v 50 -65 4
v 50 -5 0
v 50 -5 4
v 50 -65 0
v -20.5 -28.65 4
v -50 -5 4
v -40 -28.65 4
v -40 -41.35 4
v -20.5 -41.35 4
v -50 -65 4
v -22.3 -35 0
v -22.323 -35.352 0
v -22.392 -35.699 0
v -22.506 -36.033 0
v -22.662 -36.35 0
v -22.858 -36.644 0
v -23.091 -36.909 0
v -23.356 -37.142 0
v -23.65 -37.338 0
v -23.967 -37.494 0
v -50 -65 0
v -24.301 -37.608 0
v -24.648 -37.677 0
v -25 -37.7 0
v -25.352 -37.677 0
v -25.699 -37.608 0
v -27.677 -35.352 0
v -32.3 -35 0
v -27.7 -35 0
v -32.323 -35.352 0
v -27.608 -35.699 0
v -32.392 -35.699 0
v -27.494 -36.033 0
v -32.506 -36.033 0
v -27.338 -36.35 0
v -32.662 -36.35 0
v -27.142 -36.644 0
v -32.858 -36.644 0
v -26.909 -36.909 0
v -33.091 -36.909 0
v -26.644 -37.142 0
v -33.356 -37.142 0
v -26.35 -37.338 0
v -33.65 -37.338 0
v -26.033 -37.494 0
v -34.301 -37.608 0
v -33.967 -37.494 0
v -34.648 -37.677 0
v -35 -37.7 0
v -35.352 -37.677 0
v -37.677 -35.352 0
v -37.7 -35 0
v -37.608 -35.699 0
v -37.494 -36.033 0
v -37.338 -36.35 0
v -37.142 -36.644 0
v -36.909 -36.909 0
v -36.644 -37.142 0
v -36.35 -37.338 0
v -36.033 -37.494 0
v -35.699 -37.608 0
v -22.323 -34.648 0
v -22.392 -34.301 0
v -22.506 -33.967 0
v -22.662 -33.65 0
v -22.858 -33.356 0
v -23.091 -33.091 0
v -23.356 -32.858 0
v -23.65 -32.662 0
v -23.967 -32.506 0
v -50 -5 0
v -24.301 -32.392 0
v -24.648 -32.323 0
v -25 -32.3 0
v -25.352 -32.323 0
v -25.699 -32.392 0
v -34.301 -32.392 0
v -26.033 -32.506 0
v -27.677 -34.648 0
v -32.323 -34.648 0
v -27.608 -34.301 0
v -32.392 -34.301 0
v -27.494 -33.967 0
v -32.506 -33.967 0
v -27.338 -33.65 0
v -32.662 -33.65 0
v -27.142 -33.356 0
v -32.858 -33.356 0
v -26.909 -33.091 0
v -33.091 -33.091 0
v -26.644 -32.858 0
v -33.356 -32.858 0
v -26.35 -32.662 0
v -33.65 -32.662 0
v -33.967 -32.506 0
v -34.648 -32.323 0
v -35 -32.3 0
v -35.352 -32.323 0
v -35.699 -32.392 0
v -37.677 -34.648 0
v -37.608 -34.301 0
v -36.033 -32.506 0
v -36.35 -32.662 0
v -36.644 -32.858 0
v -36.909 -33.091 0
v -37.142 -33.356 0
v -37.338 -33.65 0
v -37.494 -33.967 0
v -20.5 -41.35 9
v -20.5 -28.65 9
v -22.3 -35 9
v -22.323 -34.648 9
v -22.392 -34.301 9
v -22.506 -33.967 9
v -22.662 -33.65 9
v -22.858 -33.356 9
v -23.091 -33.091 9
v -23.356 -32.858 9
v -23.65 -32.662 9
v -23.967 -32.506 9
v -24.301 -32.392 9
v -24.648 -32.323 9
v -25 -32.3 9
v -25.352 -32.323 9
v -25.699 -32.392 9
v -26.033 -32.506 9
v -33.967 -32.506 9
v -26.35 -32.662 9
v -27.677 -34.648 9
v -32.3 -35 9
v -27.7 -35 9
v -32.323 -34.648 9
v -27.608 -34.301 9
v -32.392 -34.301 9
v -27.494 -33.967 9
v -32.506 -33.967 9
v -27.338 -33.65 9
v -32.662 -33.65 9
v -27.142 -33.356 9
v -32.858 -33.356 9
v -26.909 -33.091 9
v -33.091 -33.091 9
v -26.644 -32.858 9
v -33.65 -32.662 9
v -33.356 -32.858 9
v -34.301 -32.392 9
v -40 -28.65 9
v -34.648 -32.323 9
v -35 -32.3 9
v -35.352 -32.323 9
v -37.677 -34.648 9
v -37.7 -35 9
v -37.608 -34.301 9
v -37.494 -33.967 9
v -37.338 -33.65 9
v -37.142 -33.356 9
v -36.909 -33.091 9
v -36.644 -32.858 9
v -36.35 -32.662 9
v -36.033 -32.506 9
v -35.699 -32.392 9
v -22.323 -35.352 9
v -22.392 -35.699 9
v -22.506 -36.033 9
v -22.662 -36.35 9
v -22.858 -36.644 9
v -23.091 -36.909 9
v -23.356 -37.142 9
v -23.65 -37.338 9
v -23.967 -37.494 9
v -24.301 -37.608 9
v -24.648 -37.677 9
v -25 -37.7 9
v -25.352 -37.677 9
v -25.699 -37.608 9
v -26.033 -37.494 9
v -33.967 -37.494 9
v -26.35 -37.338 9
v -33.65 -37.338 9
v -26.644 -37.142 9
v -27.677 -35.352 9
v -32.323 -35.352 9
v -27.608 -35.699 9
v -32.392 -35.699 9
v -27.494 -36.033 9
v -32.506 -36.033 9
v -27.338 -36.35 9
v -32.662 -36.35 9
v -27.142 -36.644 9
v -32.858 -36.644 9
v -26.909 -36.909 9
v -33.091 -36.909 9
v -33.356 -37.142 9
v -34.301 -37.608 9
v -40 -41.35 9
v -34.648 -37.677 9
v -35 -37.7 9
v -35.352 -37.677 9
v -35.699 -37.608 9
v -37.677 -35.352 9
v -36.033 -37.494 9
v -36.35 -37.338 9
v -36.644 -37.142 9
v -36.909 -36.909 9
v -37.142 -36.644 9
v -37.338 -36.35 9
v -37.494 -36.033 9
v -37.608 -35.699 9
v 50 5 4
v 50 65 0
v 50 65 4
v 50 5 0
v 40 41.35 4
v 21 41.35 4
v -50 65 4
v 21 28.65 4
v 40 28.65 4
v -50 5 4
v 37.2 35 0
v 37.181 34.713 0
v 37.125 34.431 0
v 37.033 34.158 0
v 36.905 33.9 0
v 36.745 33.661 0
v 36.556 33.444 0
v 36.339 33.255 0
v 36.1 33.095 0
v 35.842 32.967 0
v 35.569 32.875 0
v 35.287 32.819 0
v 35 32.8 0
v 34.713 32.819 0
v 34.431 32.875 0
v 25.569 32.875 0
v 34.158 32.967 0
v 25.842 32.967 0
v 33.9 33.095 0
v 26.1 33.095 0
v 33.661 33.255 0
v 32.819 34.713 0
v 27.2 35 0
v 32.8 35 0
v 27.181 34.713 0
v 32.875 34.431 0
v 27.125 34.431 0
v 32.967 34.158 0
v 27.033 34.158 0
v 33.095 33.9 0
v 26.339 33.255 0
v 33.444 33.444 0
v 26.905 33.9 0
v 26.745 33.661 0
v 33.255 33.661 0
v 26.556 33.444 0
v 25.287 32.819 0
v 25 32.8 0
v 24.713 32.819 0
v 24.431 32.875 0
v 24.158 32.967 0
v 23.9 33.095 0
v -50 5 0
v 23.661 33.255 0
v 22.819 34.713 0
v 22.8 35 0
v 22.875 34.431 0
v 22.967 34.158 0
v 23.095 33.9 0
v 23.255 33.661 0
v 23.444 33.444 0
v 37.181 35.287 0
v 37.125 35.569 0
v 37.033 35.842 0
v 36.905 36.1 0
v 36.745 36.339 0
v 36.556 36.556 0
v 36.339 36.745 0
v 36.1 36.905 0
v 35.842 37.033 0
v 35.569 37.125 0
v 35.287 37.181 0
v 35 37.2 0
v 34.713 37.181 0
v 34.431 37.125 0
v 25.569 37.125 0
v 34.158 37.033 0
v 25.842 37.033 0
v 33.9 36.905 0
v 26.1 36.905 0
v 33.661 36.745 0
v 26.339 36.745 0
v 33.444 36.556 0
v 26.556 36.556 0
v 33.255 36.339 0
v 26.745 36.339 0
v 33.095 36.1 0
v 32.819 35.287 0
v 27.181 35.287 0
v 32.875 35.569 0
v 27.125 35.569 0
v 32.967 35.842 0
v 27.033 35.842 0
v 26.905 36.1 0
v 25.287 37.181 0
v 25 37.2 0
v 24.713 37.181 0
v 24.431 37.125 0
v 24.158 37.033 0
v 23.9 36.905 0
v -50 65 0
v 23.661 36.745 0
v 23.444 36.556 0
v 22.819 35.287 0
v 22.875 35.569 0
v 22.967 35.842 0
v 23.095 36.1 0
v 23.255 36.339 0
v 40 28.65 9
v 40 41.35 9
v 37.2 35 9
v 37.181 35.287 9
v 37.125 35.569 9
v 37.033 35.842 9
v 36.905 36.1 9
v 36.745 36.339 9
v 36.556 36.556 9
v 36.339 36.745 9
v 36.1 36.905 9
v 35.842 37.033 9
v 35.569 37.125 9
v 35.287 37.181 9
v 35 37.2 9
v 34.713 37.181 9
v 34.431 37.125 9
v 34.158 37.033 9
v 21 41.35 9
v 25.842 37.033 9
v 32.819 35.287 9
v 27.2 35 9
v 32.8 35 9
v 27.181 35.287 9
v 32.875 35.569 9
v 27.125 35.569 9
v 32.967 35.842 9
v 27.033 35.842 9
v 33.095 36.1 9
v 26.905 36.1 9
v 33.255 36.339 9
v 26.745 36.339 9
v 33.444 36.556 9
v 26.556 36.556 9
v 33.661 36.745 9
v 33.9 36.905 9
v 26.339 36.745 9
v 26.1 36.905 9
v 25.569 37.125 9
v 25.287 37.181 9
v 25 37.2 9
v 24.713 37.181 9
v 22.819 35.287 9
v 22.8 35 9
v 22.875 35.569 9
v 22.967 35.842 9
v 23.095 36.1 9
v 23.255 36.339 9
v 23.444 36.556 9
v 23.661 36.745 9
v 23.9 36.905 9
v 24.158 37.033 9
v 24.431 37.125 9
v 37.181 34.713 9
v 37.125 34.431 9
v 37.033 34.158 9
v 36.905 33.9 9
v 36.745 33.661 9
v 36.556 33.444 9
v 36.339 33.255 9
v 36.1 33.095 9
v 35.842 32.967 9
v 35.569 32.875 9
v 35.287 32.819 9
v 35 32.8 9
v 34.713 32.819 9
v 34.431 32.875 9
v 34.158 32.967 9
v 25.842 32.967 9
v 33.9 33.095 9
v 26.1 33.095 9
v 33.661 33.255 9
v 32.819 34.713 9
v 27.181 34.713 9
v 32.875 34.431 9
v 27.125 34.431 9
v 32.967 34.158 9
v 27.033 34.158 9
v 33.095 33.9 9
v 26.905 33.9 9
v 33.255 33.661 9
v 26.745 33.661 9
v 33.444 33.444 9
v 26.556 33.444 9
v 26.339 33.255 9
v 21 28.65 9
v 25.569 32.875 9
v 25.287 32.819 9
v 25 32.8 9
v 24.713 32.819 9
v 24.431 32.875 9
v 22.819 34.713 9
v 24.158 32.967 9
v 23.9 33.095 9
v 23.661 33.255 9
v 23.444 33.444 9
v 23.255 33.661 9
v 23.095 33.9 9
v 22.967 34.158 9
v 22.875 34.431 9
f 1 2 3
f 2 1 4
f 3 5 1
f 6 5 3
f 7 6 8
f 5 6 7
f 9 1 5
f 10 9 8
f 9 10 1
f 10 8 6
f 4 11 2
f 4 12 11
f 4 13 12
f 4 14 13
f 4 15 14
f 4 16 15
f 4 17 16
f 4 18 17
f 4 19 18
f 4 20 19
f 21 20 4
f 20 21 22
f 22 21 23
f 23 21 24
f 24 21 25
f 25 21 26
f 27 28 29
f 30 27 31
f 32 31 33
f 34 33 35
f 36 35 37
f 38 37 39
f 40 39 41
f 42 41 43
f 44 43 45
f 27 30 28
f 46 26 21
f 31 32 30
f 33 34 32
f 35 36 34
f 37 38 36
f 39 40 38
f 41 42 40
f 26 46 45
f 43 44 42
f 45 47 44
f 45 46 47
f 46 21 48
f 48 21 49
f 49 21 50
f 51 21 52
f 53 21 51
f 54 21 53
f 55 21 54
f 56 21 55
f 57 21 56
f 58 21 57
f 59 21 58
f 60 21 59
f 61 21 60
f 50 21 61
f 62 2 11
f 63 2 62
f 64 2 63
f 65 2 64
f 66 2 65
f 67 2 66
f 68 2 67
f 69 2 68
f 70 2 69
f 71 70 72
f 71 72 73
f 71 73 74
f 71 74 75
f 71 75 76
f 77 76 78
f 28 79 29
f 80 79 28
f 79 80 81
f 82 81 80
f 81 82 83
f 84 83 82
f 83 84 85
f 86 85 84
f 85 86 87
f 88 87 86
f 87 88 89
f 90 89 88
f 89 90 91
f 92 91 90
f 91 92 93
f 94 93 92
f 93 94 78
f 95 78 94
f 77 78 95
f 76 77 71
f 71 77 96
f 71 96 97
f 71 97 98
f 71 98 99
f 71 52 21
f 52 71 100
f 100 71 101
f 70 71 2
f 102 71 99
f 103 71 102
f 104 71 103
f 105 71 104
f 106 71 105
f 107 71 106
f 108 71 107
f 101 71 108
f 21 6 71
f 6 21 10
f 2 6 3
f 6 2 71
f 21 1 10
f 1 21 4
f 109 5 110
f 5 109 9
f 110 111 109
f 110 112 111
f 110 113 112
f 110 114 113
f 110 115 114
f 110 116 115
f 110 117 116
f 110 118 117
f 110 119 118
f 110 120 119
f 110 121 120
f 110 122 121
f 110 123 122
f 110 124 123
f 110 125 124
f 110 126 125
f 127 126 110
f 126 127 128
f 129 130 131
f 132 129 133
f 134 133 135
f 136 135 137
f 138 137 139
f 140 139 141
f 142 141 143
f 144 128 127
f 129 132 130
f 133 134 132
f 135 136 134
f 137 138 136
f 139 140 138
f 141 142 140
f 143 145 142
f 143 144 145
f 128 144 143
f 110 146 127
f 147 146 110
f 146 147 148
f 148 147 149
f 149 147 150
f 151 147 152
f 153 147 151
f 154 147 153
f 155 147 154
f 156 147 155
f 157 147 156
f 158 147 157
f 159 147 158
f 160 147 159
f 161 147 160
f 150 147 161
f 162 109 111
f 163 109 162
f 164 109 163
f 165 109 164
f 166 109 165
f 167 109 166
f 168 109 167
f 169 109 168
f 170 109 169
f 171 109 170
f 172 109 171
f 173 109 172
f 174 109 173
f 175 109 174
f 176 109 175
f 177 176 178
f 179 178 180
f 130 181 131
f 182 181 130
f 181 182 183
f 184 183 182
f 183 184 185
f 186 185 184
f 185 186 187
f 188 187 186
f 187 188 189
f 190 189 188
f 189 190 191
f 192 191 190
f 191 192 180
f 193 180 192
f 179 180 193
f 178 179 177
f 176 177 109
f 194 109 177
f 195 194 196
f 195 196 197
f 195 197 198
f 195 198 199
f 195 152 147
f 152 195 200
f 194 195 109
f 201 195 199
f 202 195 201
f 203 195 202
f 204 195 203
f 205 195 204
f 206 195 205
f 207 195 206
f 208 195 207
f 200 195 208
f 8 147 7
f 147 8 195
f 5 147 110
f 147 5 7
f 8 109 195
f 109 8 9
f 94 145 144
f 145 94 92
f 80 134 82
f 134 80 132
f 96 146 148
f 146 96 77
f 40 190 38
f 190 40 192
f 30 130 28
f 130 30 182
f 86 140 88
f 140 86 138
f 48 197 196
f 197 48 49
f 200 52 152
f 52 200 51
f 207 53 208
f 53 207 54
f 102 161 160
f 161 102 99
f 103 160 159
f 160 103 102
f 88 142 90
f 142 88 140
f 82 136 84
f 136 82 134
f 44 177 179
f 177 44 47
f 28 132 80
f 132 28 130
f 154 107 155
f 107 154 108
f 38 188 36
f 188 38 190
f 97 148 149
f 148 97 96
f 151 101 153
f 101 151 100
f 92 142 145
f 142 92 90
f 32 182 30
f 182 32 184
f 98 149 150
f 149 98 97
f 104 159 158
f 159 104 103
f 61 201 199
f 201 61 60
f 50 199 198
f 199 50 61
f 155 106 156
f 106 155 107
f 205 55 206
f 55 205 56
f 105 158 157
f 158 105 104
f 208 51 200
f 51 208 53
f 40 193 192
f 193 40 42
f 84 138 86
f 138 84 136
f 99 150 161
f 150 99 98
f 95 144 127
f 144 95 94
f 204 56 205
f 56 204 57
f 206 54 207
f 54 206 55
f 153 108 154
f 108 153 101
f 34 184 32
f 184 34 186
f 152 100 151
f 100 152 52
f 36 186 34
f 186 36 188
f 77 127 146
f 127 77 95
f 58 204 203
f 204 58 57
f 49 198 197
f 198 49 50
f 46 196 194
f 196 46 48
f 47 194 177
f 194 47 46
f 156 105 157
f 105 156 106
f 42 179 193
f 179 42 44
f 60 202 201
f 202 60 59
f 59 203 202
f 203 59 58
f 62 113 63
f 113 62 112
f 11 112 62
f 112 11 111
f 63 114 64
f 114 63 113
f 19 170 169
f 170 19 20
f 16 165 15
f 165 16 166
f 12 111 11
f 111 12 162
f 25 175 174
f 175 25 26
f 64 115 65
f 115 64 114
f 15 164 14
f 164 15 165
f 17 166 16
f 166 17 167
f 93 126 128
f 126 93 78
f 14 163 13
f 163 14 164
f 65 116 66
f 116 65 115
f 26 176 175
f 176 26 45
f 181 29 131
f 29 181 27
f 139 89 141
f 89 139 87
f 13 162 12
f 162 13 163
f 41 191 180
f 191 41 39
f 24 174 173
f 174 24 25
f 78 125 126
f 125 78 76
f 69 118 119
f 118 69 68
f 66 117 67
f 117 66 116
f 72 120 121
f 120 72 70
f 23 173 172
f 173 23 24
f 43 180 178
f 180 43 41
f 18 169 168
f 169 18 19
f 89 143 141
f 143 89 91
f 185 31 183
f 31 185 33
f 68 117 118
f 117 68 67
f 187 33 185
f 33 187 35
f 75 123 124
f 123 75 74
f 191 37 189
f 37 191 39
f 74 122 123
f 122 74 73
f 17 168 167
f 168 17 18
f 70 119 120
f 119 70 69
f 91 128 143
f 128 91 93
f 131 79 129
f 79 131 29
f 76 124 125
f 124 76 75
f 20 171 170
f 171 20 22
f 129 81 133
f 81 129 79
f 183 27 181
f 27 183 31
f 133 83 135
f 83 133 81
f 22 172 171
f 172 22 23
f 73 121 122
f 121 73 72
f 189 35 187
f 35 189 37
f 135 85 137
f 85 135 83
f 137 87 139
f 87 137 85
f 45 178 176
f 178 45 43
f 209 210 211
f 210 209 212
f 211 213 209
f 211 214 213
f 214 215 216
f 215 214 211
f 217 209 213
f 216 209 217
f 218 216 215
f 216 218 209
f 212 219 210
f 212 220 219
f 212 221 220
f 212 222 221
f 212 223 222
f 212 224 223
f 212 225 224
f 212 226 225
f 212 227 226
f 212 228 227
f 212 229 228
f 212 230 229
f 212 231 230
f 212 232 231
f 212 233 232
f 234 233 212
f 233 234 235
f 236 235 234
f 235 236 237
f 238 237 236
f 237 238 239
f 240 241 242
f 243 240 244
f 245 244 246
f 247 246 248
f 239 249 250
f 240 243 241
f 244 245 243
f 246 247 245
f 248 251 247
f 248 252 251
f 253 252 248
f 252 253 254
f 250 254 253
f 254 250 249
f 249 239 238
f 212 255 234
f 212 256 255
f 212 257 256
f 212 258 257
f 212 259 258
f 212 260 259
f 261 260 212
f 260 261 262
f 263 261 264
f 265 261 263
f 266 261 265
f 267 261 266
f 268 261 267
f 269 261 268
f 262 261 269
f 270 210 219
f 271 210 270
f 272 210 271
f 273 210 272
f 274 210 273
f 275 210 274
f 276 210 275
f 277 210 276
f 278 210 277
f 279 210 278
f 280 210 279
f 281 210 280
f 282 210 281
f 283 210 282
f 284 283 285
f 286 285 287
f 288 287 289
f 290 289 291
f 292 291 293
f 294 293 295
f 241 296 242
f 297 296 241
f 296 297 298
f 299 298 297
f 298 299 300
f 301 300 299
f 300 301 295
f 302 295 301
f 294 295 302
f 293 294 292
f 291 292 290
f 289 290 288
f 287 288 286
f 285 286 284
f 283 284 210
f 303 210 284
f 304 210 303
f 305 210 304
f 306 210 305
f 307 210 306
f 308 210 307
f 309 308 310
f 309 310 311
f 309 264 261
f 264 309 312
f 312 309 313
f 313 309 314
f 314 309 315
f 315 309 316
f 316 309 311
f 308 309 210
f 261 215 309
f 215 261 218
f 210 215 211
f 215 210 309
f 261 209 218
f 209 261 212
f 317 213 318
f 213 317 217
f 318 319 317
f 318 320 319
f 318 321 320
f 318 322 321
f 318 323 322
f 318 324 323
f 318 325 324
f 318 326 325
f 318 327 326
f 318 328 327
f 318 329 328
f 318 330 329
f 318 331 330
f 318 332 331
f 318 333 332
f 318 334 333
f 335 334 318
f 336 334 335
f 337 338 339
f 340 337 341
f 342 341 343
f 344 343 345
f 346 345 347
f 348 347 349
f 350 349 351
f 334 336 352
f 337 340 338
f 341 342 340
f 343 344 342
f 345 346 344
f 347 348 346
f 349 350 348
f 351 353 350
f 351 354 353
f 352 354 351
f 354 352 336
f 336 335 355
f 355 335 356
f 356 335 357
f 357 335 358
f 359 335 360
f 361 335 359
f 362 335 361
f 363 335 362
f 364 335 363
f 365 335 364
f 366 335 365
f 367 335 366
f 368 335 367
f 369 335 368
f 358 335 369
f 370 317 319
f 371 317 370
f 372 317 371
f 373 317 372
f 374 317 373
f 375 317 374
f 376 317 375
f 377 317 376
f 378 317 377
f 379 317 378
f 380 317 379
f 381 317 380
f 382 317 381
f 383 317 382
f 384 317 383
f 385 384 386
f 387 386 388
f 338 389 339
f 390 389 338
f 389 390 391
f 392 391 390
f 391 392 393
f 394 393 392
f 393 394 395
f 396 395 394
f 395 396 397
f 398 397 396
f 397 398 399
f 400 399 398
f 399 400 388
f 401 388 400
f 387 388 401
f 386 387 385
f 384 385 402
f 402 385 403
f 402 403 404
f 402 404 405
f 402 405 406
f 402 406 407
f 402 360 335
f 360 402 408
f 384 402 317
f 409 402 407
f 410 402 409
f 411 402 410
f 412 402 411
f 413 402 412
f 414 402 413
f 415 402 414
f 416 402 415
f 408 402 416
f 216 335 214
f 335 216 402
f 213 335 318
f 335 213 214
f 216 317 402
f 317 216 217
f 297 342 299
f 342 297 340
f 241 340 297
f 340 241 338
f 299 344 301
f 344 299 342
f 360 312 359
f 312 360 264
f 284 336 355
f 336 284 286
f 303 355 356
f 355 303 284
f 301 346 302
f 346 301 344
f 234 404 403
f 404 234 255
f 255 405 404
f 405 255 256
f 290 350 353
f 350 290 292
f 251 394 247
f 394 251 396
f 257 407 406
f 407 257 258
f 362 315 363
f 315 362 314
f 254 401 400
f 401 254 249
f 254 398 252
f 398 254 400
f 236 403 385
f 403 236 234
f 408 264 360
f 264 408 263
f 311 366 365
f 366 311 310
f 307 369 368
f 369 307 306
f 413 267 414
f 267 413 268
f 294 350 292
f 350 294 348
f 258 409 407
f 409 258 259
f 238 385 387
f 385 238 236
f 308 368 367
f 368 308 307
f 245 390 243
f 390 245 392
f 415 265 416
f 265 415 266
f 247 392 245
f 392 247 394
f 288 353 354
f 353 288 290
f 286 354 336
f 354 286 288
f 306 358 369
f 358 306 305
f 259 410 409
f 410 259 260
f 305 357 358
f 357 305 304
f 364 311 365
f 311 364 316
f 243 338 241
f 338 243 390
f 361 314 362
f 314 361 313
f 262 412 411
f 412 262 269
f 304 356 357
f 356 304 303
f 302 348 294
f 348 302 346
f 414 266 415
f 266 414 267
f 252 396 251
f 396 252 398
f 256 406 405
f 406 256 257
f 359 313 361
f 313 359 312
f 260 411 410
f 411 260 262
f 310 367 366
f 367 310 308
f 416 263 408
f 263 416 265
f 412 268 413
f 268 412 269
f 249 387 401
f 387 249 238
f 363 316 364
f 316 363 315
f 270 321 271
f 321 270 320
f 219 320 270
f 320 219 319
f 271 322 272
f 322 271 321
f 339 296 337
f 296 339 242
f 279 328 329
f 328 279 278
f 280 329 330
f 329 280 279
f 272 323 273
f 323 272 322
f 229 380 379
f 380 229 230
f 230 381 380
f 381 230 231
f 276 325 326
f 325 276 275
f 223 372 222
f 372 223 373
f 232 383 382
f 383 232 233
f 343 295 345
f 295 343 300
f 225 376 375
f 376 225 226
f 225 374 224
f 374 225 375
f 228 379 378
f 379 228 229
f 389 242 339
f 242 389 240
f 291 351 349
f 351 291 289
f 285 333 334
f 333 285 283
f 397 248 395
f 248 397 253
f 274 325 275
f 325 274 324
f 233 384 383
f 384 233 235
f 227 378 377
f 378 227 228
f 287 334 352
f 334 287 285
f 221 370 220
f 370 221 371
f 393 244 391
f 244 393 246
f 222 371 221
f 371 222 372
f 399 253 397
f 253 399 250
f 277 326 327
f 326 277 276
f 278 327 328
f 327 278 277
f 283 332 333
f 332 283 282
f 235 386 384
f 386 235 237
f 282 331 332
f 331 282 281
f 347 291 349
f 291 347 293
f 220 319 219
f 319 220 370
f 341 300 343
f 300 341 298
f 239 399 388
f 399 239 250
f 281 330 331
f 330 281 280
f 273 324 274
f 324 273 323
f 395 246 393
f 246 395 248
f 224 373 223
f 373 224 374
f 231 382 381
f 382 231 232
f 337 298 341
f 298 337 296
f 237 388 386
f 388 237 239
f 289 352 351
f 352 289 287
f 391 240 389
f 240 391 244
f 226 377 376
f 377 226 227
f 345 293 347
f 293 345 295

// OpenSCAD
// file: ../load_cell.scad
// load_cell.scad: draws a bar load cell from a row in load_cells.scad.
//
// The bar is centred on the origin with its length along x and its mounting
// holes along z. A strain gauge sits on its top and bottom faces over the
// bending section: two bores across the bar (y), joined by a slot when the
// row gives the slot's height.
//
// A row is [name, size, gauge, bores, holes, notches]:
//   size     [length, width, height] of the bar
//   gauge    [length, width, thickness] of each strain gauge
//   bores    [diameter, [x1, y1], [x2, y2]], or with a 4th value, the height
//            of the slot between them
//   holes    groups of mounting holes, each [diameter, [xA, yA], [xB, yB]]
//   notches  [length, depth] of the notches along both sides, or undef

function lc_name(type) = type[0]; // e.g. "TAL220"
function lc_cell_dims(type) = type[1]; // [length, width, height]
function lc_sensor_dims(type) = type[2]; // [length, width, thickness]
function lc_center_cutout(type) = type[3]; // [diameter, [x1, y1], [x2, y2] (, slot height)]
function lc_screw_holes(type) = type[4]; // [[diameter, [xA, yA], [xB, yB]], ...]
function lc_side_cuts(type) = type[5]; // [length, depth], or undef

module load_cell(type, load_cell_color = "silver", sensor_color = "white") {
    size = lc_cell_dims(type);
    gauge = lc_sensor_dims(type);
    bores = lc_center_cutout(type);
    holes = lc_screw_holes(type);
    notches = lc_side_cuts(type);

    difference() {
        union() {
            color(load_cell_color) cube(size, center=true);
            color(sensor_color)for (s = [-1, 1]) translate([0, 0, s * (size.z + gauge.z) / 2]) cube(gauge, center=true);
        }
        // Notches along both sides, rounded at their ends
        if (is_list(notches))
            for (y = [-size.y / 2, size.y / 2])
                hull()for (x = [-1, 1])
                    translate([x * (notches[0] / 2 - 2), y, 0])
                        cylinder(r=notches[1], h=size.z + 1, center=true, $fn=15);
        // The bending section
        for (p = [bores[1], bores[2]])
            translate([p.x, 0, 0]) rotate([90, 0, 0]) cylinder(d=bores[0], h=size.y + 1, center=true, $fn=50);
        if (len(bores) > 3)
            translate([(bores[1].x + bores[2].x) / 2, 0, 0]) cube([abs(bores[1].x - bores[2].x), size.y + 1, bores[3]], center=true);
        // Mounting holes, through the bar
        for (g = holes, p = [g[1], g[2]])
            translate([p.x, p.y, 0]) cylinder(d=g[0], h=size.z + 2, center=true, $fn=50);
    }
}
// file: ../load_cells.scad
// load_cells.scad: bar load cells, one row each, for load_cell().
//
// include this file to get the LC_* rows and the load_cells list; it uses
// load_cell.scad for the accessors and the drawing. The row format is at the
// top of load_cell.scad. Sizes in mm; the bar is centred on the origin.

//                   name              size                  gauge          bores                              mounting holes                                                notches
// komputer.de 10 kg: the TAL220's bar with its own hole positions; M4 both ends.
LC_komputer_10kg = ["komputer_10kg", [75.2, 12.7, 12.7], [24, 12, 1], [12.0, [4, 0], [-4, 0]], [[4, [-31.6, 0], [-21.6, 0]], [4, [21.6, 0], [31.6, 0]]], undef];

// komputer.de 5 kg: M5 at one end, M4 at the other.
LC_komputer_5kg = ["komputer_5kg", [80.2, 12.7, 12.7], [24, 12, 1], [12.0, [4, 0], [-4, 0]], [[5, [-35, 0], [-20, 0]], [4, [20, 0], [35, 0]]], undef];

// TAL220 (10 kg straight bar): M5 at one end, M4 at the other.
LC_TAL220 = ["TAL220", [80, 12.7, 12.7], [24, 12, 1], [12.0, [4, 0], [-4, 0]], [[5, [-35, 0], [-25, 0]], [4, [25, 0], [35, 0]]], undef];

// TAL220B (5 kg straight bar): one M5 hole at each end.
LC_TAL220B = ["TAL220B", [55, 12.7, 12.7], [24, 12, 1], [12.0, [4, 0], [-4, 0]], [[5, [-20, 0], [20, 0]]], undef];

// TAL221 (100 g mini bar): bores joined by a 3 mm slot, notched sides, two
// M3 holes at each end.
LC_TAL221 = ["TAL221", [47, 12, 6], [30, 6, 1], [5.3, [10, 0], [-10, 0], 3], [[3.0, [-20, -3], [-20, 3]], [3.2, [20, -3], [20, 3]]], [33, 2]];

load_cells = [LC_komputer_10kg, LC_komputer_5kg, LC_TAL220, LC_TAL220B, LC_TAL221];

use <load_cell.scad>
// main file
// A single-bar scale: a base and a platform, each bolted to one end of the load cell.
// Each has a spacer under its end of the bar, so the middle of the bar, where the gauges are,
// is free to bend. The screw holes come from the cell's row, so another cell needs no new numbers.

include <../load_cells.scad>

/* [Scale] */
// Load cell, by its row name
cell = "TAL220"; // [TAL220, TAL220B, TAL221, komputer_10kg, komputer_5kg]
// Length of the base and the platform, along the bar (mm)
plate_length = 100; // [50:5:300]
// Width of the base and the platform (mm)
plate_width = 60; // [20:5:300]
// Thickness of the base and the platform (mm)
plate_thickness = 4; // [2:0.5:10]
// Height of each spacer, the gap the bar bends into (mm)
spacer_height = 5; // [2:0.5:15]
// Clearance on each screw hole's diameter (mm)
hole_clearance = 0.4; // [0:0.1:1]

/* [View] */
// The parts laid out for printing, or put together on the cell
view = "print"; // [print, assembled]

/* [Hidden] */
$fn = 48;
type = [for (t = load_cells) if (lc_name(t) == cell) t][0];
assert(!is_undef(type), str("no load cell named ", cell));

size = lc_cell_dims(type);
gauge = lc_sensor_dims(type);
holes = [for (g = lc_screw_holes(type), p = [g[1], g[2]]) [g[0], p]];

// A spacer runs from the bar's end inward to just past its holes, and stops short of the gauges.
function spacer_from(end) = min([for (h = holes) if (sign(h[1].x) == end) abs(h[1].x) - h[0] / 2]) - 2;
assert(
    spacer_from(-1) > gauge.x / 2 && spacer_from(1) > gauge.x / 2,
    "the spacers would reach the gauges: this cell's holes are too close to its middle"
);
assert(spacer_height > gauge.z + 1, str("spacer_height must leave the gauges at least 1 mm: more than ", gauge.z + 1));
assert(plate_length >= size.x, str("plate_length must be at least the bar's length, ", size.x));
assert(plate_width >= size.y, str("plate_width must be at least the bar's width, ", size.y));

// One part, drawn plate down from z = 0: the plate, and on it the spacer under the bar's `end`
// (-1 or +1 along x), with clearance holes for that end's screws.
module part(end) {
    inner = spacer_from(end);
    difference() {
        union() {
            translate([-plate_length / 2, -plate_width / 2, 0]) cube([plate_length, plate_width, plate_thickness]);
            translate([end > 0 ? inner : -size.x / 2, -size.y / 2, plate_thickness])
                cube([size.x / 2 - inner, size.y, spacer_height]);
        }
        for (h = holes)
            if (sign(h[1].x) == end)
                translate([h[1].x, h[1].y, -1]) cylinder(d=h[0] + hole_clearance, h=plate_thickness + spacer_height + 2);
    }
}

if (view == "print") {
    translate([0, -plate_width / 2 - 5, 0]) part(-1);
    translate([0, plate_width / 2 + 5, 0]) part(1);
} else if (view == "assembled") {
    load_cell(type);
    // The base, under the bar, holding its -x end.
    translate([0, 0, -size.z / 2 - spacer_height - plate_thickness]) part(-1);
    // The platform, over the bar, holding its +x end.
    translate([0, 0, size.z / 2 + spacer_height + plate_thickness]) mirror([0, 0, 1]) part(1);
}
